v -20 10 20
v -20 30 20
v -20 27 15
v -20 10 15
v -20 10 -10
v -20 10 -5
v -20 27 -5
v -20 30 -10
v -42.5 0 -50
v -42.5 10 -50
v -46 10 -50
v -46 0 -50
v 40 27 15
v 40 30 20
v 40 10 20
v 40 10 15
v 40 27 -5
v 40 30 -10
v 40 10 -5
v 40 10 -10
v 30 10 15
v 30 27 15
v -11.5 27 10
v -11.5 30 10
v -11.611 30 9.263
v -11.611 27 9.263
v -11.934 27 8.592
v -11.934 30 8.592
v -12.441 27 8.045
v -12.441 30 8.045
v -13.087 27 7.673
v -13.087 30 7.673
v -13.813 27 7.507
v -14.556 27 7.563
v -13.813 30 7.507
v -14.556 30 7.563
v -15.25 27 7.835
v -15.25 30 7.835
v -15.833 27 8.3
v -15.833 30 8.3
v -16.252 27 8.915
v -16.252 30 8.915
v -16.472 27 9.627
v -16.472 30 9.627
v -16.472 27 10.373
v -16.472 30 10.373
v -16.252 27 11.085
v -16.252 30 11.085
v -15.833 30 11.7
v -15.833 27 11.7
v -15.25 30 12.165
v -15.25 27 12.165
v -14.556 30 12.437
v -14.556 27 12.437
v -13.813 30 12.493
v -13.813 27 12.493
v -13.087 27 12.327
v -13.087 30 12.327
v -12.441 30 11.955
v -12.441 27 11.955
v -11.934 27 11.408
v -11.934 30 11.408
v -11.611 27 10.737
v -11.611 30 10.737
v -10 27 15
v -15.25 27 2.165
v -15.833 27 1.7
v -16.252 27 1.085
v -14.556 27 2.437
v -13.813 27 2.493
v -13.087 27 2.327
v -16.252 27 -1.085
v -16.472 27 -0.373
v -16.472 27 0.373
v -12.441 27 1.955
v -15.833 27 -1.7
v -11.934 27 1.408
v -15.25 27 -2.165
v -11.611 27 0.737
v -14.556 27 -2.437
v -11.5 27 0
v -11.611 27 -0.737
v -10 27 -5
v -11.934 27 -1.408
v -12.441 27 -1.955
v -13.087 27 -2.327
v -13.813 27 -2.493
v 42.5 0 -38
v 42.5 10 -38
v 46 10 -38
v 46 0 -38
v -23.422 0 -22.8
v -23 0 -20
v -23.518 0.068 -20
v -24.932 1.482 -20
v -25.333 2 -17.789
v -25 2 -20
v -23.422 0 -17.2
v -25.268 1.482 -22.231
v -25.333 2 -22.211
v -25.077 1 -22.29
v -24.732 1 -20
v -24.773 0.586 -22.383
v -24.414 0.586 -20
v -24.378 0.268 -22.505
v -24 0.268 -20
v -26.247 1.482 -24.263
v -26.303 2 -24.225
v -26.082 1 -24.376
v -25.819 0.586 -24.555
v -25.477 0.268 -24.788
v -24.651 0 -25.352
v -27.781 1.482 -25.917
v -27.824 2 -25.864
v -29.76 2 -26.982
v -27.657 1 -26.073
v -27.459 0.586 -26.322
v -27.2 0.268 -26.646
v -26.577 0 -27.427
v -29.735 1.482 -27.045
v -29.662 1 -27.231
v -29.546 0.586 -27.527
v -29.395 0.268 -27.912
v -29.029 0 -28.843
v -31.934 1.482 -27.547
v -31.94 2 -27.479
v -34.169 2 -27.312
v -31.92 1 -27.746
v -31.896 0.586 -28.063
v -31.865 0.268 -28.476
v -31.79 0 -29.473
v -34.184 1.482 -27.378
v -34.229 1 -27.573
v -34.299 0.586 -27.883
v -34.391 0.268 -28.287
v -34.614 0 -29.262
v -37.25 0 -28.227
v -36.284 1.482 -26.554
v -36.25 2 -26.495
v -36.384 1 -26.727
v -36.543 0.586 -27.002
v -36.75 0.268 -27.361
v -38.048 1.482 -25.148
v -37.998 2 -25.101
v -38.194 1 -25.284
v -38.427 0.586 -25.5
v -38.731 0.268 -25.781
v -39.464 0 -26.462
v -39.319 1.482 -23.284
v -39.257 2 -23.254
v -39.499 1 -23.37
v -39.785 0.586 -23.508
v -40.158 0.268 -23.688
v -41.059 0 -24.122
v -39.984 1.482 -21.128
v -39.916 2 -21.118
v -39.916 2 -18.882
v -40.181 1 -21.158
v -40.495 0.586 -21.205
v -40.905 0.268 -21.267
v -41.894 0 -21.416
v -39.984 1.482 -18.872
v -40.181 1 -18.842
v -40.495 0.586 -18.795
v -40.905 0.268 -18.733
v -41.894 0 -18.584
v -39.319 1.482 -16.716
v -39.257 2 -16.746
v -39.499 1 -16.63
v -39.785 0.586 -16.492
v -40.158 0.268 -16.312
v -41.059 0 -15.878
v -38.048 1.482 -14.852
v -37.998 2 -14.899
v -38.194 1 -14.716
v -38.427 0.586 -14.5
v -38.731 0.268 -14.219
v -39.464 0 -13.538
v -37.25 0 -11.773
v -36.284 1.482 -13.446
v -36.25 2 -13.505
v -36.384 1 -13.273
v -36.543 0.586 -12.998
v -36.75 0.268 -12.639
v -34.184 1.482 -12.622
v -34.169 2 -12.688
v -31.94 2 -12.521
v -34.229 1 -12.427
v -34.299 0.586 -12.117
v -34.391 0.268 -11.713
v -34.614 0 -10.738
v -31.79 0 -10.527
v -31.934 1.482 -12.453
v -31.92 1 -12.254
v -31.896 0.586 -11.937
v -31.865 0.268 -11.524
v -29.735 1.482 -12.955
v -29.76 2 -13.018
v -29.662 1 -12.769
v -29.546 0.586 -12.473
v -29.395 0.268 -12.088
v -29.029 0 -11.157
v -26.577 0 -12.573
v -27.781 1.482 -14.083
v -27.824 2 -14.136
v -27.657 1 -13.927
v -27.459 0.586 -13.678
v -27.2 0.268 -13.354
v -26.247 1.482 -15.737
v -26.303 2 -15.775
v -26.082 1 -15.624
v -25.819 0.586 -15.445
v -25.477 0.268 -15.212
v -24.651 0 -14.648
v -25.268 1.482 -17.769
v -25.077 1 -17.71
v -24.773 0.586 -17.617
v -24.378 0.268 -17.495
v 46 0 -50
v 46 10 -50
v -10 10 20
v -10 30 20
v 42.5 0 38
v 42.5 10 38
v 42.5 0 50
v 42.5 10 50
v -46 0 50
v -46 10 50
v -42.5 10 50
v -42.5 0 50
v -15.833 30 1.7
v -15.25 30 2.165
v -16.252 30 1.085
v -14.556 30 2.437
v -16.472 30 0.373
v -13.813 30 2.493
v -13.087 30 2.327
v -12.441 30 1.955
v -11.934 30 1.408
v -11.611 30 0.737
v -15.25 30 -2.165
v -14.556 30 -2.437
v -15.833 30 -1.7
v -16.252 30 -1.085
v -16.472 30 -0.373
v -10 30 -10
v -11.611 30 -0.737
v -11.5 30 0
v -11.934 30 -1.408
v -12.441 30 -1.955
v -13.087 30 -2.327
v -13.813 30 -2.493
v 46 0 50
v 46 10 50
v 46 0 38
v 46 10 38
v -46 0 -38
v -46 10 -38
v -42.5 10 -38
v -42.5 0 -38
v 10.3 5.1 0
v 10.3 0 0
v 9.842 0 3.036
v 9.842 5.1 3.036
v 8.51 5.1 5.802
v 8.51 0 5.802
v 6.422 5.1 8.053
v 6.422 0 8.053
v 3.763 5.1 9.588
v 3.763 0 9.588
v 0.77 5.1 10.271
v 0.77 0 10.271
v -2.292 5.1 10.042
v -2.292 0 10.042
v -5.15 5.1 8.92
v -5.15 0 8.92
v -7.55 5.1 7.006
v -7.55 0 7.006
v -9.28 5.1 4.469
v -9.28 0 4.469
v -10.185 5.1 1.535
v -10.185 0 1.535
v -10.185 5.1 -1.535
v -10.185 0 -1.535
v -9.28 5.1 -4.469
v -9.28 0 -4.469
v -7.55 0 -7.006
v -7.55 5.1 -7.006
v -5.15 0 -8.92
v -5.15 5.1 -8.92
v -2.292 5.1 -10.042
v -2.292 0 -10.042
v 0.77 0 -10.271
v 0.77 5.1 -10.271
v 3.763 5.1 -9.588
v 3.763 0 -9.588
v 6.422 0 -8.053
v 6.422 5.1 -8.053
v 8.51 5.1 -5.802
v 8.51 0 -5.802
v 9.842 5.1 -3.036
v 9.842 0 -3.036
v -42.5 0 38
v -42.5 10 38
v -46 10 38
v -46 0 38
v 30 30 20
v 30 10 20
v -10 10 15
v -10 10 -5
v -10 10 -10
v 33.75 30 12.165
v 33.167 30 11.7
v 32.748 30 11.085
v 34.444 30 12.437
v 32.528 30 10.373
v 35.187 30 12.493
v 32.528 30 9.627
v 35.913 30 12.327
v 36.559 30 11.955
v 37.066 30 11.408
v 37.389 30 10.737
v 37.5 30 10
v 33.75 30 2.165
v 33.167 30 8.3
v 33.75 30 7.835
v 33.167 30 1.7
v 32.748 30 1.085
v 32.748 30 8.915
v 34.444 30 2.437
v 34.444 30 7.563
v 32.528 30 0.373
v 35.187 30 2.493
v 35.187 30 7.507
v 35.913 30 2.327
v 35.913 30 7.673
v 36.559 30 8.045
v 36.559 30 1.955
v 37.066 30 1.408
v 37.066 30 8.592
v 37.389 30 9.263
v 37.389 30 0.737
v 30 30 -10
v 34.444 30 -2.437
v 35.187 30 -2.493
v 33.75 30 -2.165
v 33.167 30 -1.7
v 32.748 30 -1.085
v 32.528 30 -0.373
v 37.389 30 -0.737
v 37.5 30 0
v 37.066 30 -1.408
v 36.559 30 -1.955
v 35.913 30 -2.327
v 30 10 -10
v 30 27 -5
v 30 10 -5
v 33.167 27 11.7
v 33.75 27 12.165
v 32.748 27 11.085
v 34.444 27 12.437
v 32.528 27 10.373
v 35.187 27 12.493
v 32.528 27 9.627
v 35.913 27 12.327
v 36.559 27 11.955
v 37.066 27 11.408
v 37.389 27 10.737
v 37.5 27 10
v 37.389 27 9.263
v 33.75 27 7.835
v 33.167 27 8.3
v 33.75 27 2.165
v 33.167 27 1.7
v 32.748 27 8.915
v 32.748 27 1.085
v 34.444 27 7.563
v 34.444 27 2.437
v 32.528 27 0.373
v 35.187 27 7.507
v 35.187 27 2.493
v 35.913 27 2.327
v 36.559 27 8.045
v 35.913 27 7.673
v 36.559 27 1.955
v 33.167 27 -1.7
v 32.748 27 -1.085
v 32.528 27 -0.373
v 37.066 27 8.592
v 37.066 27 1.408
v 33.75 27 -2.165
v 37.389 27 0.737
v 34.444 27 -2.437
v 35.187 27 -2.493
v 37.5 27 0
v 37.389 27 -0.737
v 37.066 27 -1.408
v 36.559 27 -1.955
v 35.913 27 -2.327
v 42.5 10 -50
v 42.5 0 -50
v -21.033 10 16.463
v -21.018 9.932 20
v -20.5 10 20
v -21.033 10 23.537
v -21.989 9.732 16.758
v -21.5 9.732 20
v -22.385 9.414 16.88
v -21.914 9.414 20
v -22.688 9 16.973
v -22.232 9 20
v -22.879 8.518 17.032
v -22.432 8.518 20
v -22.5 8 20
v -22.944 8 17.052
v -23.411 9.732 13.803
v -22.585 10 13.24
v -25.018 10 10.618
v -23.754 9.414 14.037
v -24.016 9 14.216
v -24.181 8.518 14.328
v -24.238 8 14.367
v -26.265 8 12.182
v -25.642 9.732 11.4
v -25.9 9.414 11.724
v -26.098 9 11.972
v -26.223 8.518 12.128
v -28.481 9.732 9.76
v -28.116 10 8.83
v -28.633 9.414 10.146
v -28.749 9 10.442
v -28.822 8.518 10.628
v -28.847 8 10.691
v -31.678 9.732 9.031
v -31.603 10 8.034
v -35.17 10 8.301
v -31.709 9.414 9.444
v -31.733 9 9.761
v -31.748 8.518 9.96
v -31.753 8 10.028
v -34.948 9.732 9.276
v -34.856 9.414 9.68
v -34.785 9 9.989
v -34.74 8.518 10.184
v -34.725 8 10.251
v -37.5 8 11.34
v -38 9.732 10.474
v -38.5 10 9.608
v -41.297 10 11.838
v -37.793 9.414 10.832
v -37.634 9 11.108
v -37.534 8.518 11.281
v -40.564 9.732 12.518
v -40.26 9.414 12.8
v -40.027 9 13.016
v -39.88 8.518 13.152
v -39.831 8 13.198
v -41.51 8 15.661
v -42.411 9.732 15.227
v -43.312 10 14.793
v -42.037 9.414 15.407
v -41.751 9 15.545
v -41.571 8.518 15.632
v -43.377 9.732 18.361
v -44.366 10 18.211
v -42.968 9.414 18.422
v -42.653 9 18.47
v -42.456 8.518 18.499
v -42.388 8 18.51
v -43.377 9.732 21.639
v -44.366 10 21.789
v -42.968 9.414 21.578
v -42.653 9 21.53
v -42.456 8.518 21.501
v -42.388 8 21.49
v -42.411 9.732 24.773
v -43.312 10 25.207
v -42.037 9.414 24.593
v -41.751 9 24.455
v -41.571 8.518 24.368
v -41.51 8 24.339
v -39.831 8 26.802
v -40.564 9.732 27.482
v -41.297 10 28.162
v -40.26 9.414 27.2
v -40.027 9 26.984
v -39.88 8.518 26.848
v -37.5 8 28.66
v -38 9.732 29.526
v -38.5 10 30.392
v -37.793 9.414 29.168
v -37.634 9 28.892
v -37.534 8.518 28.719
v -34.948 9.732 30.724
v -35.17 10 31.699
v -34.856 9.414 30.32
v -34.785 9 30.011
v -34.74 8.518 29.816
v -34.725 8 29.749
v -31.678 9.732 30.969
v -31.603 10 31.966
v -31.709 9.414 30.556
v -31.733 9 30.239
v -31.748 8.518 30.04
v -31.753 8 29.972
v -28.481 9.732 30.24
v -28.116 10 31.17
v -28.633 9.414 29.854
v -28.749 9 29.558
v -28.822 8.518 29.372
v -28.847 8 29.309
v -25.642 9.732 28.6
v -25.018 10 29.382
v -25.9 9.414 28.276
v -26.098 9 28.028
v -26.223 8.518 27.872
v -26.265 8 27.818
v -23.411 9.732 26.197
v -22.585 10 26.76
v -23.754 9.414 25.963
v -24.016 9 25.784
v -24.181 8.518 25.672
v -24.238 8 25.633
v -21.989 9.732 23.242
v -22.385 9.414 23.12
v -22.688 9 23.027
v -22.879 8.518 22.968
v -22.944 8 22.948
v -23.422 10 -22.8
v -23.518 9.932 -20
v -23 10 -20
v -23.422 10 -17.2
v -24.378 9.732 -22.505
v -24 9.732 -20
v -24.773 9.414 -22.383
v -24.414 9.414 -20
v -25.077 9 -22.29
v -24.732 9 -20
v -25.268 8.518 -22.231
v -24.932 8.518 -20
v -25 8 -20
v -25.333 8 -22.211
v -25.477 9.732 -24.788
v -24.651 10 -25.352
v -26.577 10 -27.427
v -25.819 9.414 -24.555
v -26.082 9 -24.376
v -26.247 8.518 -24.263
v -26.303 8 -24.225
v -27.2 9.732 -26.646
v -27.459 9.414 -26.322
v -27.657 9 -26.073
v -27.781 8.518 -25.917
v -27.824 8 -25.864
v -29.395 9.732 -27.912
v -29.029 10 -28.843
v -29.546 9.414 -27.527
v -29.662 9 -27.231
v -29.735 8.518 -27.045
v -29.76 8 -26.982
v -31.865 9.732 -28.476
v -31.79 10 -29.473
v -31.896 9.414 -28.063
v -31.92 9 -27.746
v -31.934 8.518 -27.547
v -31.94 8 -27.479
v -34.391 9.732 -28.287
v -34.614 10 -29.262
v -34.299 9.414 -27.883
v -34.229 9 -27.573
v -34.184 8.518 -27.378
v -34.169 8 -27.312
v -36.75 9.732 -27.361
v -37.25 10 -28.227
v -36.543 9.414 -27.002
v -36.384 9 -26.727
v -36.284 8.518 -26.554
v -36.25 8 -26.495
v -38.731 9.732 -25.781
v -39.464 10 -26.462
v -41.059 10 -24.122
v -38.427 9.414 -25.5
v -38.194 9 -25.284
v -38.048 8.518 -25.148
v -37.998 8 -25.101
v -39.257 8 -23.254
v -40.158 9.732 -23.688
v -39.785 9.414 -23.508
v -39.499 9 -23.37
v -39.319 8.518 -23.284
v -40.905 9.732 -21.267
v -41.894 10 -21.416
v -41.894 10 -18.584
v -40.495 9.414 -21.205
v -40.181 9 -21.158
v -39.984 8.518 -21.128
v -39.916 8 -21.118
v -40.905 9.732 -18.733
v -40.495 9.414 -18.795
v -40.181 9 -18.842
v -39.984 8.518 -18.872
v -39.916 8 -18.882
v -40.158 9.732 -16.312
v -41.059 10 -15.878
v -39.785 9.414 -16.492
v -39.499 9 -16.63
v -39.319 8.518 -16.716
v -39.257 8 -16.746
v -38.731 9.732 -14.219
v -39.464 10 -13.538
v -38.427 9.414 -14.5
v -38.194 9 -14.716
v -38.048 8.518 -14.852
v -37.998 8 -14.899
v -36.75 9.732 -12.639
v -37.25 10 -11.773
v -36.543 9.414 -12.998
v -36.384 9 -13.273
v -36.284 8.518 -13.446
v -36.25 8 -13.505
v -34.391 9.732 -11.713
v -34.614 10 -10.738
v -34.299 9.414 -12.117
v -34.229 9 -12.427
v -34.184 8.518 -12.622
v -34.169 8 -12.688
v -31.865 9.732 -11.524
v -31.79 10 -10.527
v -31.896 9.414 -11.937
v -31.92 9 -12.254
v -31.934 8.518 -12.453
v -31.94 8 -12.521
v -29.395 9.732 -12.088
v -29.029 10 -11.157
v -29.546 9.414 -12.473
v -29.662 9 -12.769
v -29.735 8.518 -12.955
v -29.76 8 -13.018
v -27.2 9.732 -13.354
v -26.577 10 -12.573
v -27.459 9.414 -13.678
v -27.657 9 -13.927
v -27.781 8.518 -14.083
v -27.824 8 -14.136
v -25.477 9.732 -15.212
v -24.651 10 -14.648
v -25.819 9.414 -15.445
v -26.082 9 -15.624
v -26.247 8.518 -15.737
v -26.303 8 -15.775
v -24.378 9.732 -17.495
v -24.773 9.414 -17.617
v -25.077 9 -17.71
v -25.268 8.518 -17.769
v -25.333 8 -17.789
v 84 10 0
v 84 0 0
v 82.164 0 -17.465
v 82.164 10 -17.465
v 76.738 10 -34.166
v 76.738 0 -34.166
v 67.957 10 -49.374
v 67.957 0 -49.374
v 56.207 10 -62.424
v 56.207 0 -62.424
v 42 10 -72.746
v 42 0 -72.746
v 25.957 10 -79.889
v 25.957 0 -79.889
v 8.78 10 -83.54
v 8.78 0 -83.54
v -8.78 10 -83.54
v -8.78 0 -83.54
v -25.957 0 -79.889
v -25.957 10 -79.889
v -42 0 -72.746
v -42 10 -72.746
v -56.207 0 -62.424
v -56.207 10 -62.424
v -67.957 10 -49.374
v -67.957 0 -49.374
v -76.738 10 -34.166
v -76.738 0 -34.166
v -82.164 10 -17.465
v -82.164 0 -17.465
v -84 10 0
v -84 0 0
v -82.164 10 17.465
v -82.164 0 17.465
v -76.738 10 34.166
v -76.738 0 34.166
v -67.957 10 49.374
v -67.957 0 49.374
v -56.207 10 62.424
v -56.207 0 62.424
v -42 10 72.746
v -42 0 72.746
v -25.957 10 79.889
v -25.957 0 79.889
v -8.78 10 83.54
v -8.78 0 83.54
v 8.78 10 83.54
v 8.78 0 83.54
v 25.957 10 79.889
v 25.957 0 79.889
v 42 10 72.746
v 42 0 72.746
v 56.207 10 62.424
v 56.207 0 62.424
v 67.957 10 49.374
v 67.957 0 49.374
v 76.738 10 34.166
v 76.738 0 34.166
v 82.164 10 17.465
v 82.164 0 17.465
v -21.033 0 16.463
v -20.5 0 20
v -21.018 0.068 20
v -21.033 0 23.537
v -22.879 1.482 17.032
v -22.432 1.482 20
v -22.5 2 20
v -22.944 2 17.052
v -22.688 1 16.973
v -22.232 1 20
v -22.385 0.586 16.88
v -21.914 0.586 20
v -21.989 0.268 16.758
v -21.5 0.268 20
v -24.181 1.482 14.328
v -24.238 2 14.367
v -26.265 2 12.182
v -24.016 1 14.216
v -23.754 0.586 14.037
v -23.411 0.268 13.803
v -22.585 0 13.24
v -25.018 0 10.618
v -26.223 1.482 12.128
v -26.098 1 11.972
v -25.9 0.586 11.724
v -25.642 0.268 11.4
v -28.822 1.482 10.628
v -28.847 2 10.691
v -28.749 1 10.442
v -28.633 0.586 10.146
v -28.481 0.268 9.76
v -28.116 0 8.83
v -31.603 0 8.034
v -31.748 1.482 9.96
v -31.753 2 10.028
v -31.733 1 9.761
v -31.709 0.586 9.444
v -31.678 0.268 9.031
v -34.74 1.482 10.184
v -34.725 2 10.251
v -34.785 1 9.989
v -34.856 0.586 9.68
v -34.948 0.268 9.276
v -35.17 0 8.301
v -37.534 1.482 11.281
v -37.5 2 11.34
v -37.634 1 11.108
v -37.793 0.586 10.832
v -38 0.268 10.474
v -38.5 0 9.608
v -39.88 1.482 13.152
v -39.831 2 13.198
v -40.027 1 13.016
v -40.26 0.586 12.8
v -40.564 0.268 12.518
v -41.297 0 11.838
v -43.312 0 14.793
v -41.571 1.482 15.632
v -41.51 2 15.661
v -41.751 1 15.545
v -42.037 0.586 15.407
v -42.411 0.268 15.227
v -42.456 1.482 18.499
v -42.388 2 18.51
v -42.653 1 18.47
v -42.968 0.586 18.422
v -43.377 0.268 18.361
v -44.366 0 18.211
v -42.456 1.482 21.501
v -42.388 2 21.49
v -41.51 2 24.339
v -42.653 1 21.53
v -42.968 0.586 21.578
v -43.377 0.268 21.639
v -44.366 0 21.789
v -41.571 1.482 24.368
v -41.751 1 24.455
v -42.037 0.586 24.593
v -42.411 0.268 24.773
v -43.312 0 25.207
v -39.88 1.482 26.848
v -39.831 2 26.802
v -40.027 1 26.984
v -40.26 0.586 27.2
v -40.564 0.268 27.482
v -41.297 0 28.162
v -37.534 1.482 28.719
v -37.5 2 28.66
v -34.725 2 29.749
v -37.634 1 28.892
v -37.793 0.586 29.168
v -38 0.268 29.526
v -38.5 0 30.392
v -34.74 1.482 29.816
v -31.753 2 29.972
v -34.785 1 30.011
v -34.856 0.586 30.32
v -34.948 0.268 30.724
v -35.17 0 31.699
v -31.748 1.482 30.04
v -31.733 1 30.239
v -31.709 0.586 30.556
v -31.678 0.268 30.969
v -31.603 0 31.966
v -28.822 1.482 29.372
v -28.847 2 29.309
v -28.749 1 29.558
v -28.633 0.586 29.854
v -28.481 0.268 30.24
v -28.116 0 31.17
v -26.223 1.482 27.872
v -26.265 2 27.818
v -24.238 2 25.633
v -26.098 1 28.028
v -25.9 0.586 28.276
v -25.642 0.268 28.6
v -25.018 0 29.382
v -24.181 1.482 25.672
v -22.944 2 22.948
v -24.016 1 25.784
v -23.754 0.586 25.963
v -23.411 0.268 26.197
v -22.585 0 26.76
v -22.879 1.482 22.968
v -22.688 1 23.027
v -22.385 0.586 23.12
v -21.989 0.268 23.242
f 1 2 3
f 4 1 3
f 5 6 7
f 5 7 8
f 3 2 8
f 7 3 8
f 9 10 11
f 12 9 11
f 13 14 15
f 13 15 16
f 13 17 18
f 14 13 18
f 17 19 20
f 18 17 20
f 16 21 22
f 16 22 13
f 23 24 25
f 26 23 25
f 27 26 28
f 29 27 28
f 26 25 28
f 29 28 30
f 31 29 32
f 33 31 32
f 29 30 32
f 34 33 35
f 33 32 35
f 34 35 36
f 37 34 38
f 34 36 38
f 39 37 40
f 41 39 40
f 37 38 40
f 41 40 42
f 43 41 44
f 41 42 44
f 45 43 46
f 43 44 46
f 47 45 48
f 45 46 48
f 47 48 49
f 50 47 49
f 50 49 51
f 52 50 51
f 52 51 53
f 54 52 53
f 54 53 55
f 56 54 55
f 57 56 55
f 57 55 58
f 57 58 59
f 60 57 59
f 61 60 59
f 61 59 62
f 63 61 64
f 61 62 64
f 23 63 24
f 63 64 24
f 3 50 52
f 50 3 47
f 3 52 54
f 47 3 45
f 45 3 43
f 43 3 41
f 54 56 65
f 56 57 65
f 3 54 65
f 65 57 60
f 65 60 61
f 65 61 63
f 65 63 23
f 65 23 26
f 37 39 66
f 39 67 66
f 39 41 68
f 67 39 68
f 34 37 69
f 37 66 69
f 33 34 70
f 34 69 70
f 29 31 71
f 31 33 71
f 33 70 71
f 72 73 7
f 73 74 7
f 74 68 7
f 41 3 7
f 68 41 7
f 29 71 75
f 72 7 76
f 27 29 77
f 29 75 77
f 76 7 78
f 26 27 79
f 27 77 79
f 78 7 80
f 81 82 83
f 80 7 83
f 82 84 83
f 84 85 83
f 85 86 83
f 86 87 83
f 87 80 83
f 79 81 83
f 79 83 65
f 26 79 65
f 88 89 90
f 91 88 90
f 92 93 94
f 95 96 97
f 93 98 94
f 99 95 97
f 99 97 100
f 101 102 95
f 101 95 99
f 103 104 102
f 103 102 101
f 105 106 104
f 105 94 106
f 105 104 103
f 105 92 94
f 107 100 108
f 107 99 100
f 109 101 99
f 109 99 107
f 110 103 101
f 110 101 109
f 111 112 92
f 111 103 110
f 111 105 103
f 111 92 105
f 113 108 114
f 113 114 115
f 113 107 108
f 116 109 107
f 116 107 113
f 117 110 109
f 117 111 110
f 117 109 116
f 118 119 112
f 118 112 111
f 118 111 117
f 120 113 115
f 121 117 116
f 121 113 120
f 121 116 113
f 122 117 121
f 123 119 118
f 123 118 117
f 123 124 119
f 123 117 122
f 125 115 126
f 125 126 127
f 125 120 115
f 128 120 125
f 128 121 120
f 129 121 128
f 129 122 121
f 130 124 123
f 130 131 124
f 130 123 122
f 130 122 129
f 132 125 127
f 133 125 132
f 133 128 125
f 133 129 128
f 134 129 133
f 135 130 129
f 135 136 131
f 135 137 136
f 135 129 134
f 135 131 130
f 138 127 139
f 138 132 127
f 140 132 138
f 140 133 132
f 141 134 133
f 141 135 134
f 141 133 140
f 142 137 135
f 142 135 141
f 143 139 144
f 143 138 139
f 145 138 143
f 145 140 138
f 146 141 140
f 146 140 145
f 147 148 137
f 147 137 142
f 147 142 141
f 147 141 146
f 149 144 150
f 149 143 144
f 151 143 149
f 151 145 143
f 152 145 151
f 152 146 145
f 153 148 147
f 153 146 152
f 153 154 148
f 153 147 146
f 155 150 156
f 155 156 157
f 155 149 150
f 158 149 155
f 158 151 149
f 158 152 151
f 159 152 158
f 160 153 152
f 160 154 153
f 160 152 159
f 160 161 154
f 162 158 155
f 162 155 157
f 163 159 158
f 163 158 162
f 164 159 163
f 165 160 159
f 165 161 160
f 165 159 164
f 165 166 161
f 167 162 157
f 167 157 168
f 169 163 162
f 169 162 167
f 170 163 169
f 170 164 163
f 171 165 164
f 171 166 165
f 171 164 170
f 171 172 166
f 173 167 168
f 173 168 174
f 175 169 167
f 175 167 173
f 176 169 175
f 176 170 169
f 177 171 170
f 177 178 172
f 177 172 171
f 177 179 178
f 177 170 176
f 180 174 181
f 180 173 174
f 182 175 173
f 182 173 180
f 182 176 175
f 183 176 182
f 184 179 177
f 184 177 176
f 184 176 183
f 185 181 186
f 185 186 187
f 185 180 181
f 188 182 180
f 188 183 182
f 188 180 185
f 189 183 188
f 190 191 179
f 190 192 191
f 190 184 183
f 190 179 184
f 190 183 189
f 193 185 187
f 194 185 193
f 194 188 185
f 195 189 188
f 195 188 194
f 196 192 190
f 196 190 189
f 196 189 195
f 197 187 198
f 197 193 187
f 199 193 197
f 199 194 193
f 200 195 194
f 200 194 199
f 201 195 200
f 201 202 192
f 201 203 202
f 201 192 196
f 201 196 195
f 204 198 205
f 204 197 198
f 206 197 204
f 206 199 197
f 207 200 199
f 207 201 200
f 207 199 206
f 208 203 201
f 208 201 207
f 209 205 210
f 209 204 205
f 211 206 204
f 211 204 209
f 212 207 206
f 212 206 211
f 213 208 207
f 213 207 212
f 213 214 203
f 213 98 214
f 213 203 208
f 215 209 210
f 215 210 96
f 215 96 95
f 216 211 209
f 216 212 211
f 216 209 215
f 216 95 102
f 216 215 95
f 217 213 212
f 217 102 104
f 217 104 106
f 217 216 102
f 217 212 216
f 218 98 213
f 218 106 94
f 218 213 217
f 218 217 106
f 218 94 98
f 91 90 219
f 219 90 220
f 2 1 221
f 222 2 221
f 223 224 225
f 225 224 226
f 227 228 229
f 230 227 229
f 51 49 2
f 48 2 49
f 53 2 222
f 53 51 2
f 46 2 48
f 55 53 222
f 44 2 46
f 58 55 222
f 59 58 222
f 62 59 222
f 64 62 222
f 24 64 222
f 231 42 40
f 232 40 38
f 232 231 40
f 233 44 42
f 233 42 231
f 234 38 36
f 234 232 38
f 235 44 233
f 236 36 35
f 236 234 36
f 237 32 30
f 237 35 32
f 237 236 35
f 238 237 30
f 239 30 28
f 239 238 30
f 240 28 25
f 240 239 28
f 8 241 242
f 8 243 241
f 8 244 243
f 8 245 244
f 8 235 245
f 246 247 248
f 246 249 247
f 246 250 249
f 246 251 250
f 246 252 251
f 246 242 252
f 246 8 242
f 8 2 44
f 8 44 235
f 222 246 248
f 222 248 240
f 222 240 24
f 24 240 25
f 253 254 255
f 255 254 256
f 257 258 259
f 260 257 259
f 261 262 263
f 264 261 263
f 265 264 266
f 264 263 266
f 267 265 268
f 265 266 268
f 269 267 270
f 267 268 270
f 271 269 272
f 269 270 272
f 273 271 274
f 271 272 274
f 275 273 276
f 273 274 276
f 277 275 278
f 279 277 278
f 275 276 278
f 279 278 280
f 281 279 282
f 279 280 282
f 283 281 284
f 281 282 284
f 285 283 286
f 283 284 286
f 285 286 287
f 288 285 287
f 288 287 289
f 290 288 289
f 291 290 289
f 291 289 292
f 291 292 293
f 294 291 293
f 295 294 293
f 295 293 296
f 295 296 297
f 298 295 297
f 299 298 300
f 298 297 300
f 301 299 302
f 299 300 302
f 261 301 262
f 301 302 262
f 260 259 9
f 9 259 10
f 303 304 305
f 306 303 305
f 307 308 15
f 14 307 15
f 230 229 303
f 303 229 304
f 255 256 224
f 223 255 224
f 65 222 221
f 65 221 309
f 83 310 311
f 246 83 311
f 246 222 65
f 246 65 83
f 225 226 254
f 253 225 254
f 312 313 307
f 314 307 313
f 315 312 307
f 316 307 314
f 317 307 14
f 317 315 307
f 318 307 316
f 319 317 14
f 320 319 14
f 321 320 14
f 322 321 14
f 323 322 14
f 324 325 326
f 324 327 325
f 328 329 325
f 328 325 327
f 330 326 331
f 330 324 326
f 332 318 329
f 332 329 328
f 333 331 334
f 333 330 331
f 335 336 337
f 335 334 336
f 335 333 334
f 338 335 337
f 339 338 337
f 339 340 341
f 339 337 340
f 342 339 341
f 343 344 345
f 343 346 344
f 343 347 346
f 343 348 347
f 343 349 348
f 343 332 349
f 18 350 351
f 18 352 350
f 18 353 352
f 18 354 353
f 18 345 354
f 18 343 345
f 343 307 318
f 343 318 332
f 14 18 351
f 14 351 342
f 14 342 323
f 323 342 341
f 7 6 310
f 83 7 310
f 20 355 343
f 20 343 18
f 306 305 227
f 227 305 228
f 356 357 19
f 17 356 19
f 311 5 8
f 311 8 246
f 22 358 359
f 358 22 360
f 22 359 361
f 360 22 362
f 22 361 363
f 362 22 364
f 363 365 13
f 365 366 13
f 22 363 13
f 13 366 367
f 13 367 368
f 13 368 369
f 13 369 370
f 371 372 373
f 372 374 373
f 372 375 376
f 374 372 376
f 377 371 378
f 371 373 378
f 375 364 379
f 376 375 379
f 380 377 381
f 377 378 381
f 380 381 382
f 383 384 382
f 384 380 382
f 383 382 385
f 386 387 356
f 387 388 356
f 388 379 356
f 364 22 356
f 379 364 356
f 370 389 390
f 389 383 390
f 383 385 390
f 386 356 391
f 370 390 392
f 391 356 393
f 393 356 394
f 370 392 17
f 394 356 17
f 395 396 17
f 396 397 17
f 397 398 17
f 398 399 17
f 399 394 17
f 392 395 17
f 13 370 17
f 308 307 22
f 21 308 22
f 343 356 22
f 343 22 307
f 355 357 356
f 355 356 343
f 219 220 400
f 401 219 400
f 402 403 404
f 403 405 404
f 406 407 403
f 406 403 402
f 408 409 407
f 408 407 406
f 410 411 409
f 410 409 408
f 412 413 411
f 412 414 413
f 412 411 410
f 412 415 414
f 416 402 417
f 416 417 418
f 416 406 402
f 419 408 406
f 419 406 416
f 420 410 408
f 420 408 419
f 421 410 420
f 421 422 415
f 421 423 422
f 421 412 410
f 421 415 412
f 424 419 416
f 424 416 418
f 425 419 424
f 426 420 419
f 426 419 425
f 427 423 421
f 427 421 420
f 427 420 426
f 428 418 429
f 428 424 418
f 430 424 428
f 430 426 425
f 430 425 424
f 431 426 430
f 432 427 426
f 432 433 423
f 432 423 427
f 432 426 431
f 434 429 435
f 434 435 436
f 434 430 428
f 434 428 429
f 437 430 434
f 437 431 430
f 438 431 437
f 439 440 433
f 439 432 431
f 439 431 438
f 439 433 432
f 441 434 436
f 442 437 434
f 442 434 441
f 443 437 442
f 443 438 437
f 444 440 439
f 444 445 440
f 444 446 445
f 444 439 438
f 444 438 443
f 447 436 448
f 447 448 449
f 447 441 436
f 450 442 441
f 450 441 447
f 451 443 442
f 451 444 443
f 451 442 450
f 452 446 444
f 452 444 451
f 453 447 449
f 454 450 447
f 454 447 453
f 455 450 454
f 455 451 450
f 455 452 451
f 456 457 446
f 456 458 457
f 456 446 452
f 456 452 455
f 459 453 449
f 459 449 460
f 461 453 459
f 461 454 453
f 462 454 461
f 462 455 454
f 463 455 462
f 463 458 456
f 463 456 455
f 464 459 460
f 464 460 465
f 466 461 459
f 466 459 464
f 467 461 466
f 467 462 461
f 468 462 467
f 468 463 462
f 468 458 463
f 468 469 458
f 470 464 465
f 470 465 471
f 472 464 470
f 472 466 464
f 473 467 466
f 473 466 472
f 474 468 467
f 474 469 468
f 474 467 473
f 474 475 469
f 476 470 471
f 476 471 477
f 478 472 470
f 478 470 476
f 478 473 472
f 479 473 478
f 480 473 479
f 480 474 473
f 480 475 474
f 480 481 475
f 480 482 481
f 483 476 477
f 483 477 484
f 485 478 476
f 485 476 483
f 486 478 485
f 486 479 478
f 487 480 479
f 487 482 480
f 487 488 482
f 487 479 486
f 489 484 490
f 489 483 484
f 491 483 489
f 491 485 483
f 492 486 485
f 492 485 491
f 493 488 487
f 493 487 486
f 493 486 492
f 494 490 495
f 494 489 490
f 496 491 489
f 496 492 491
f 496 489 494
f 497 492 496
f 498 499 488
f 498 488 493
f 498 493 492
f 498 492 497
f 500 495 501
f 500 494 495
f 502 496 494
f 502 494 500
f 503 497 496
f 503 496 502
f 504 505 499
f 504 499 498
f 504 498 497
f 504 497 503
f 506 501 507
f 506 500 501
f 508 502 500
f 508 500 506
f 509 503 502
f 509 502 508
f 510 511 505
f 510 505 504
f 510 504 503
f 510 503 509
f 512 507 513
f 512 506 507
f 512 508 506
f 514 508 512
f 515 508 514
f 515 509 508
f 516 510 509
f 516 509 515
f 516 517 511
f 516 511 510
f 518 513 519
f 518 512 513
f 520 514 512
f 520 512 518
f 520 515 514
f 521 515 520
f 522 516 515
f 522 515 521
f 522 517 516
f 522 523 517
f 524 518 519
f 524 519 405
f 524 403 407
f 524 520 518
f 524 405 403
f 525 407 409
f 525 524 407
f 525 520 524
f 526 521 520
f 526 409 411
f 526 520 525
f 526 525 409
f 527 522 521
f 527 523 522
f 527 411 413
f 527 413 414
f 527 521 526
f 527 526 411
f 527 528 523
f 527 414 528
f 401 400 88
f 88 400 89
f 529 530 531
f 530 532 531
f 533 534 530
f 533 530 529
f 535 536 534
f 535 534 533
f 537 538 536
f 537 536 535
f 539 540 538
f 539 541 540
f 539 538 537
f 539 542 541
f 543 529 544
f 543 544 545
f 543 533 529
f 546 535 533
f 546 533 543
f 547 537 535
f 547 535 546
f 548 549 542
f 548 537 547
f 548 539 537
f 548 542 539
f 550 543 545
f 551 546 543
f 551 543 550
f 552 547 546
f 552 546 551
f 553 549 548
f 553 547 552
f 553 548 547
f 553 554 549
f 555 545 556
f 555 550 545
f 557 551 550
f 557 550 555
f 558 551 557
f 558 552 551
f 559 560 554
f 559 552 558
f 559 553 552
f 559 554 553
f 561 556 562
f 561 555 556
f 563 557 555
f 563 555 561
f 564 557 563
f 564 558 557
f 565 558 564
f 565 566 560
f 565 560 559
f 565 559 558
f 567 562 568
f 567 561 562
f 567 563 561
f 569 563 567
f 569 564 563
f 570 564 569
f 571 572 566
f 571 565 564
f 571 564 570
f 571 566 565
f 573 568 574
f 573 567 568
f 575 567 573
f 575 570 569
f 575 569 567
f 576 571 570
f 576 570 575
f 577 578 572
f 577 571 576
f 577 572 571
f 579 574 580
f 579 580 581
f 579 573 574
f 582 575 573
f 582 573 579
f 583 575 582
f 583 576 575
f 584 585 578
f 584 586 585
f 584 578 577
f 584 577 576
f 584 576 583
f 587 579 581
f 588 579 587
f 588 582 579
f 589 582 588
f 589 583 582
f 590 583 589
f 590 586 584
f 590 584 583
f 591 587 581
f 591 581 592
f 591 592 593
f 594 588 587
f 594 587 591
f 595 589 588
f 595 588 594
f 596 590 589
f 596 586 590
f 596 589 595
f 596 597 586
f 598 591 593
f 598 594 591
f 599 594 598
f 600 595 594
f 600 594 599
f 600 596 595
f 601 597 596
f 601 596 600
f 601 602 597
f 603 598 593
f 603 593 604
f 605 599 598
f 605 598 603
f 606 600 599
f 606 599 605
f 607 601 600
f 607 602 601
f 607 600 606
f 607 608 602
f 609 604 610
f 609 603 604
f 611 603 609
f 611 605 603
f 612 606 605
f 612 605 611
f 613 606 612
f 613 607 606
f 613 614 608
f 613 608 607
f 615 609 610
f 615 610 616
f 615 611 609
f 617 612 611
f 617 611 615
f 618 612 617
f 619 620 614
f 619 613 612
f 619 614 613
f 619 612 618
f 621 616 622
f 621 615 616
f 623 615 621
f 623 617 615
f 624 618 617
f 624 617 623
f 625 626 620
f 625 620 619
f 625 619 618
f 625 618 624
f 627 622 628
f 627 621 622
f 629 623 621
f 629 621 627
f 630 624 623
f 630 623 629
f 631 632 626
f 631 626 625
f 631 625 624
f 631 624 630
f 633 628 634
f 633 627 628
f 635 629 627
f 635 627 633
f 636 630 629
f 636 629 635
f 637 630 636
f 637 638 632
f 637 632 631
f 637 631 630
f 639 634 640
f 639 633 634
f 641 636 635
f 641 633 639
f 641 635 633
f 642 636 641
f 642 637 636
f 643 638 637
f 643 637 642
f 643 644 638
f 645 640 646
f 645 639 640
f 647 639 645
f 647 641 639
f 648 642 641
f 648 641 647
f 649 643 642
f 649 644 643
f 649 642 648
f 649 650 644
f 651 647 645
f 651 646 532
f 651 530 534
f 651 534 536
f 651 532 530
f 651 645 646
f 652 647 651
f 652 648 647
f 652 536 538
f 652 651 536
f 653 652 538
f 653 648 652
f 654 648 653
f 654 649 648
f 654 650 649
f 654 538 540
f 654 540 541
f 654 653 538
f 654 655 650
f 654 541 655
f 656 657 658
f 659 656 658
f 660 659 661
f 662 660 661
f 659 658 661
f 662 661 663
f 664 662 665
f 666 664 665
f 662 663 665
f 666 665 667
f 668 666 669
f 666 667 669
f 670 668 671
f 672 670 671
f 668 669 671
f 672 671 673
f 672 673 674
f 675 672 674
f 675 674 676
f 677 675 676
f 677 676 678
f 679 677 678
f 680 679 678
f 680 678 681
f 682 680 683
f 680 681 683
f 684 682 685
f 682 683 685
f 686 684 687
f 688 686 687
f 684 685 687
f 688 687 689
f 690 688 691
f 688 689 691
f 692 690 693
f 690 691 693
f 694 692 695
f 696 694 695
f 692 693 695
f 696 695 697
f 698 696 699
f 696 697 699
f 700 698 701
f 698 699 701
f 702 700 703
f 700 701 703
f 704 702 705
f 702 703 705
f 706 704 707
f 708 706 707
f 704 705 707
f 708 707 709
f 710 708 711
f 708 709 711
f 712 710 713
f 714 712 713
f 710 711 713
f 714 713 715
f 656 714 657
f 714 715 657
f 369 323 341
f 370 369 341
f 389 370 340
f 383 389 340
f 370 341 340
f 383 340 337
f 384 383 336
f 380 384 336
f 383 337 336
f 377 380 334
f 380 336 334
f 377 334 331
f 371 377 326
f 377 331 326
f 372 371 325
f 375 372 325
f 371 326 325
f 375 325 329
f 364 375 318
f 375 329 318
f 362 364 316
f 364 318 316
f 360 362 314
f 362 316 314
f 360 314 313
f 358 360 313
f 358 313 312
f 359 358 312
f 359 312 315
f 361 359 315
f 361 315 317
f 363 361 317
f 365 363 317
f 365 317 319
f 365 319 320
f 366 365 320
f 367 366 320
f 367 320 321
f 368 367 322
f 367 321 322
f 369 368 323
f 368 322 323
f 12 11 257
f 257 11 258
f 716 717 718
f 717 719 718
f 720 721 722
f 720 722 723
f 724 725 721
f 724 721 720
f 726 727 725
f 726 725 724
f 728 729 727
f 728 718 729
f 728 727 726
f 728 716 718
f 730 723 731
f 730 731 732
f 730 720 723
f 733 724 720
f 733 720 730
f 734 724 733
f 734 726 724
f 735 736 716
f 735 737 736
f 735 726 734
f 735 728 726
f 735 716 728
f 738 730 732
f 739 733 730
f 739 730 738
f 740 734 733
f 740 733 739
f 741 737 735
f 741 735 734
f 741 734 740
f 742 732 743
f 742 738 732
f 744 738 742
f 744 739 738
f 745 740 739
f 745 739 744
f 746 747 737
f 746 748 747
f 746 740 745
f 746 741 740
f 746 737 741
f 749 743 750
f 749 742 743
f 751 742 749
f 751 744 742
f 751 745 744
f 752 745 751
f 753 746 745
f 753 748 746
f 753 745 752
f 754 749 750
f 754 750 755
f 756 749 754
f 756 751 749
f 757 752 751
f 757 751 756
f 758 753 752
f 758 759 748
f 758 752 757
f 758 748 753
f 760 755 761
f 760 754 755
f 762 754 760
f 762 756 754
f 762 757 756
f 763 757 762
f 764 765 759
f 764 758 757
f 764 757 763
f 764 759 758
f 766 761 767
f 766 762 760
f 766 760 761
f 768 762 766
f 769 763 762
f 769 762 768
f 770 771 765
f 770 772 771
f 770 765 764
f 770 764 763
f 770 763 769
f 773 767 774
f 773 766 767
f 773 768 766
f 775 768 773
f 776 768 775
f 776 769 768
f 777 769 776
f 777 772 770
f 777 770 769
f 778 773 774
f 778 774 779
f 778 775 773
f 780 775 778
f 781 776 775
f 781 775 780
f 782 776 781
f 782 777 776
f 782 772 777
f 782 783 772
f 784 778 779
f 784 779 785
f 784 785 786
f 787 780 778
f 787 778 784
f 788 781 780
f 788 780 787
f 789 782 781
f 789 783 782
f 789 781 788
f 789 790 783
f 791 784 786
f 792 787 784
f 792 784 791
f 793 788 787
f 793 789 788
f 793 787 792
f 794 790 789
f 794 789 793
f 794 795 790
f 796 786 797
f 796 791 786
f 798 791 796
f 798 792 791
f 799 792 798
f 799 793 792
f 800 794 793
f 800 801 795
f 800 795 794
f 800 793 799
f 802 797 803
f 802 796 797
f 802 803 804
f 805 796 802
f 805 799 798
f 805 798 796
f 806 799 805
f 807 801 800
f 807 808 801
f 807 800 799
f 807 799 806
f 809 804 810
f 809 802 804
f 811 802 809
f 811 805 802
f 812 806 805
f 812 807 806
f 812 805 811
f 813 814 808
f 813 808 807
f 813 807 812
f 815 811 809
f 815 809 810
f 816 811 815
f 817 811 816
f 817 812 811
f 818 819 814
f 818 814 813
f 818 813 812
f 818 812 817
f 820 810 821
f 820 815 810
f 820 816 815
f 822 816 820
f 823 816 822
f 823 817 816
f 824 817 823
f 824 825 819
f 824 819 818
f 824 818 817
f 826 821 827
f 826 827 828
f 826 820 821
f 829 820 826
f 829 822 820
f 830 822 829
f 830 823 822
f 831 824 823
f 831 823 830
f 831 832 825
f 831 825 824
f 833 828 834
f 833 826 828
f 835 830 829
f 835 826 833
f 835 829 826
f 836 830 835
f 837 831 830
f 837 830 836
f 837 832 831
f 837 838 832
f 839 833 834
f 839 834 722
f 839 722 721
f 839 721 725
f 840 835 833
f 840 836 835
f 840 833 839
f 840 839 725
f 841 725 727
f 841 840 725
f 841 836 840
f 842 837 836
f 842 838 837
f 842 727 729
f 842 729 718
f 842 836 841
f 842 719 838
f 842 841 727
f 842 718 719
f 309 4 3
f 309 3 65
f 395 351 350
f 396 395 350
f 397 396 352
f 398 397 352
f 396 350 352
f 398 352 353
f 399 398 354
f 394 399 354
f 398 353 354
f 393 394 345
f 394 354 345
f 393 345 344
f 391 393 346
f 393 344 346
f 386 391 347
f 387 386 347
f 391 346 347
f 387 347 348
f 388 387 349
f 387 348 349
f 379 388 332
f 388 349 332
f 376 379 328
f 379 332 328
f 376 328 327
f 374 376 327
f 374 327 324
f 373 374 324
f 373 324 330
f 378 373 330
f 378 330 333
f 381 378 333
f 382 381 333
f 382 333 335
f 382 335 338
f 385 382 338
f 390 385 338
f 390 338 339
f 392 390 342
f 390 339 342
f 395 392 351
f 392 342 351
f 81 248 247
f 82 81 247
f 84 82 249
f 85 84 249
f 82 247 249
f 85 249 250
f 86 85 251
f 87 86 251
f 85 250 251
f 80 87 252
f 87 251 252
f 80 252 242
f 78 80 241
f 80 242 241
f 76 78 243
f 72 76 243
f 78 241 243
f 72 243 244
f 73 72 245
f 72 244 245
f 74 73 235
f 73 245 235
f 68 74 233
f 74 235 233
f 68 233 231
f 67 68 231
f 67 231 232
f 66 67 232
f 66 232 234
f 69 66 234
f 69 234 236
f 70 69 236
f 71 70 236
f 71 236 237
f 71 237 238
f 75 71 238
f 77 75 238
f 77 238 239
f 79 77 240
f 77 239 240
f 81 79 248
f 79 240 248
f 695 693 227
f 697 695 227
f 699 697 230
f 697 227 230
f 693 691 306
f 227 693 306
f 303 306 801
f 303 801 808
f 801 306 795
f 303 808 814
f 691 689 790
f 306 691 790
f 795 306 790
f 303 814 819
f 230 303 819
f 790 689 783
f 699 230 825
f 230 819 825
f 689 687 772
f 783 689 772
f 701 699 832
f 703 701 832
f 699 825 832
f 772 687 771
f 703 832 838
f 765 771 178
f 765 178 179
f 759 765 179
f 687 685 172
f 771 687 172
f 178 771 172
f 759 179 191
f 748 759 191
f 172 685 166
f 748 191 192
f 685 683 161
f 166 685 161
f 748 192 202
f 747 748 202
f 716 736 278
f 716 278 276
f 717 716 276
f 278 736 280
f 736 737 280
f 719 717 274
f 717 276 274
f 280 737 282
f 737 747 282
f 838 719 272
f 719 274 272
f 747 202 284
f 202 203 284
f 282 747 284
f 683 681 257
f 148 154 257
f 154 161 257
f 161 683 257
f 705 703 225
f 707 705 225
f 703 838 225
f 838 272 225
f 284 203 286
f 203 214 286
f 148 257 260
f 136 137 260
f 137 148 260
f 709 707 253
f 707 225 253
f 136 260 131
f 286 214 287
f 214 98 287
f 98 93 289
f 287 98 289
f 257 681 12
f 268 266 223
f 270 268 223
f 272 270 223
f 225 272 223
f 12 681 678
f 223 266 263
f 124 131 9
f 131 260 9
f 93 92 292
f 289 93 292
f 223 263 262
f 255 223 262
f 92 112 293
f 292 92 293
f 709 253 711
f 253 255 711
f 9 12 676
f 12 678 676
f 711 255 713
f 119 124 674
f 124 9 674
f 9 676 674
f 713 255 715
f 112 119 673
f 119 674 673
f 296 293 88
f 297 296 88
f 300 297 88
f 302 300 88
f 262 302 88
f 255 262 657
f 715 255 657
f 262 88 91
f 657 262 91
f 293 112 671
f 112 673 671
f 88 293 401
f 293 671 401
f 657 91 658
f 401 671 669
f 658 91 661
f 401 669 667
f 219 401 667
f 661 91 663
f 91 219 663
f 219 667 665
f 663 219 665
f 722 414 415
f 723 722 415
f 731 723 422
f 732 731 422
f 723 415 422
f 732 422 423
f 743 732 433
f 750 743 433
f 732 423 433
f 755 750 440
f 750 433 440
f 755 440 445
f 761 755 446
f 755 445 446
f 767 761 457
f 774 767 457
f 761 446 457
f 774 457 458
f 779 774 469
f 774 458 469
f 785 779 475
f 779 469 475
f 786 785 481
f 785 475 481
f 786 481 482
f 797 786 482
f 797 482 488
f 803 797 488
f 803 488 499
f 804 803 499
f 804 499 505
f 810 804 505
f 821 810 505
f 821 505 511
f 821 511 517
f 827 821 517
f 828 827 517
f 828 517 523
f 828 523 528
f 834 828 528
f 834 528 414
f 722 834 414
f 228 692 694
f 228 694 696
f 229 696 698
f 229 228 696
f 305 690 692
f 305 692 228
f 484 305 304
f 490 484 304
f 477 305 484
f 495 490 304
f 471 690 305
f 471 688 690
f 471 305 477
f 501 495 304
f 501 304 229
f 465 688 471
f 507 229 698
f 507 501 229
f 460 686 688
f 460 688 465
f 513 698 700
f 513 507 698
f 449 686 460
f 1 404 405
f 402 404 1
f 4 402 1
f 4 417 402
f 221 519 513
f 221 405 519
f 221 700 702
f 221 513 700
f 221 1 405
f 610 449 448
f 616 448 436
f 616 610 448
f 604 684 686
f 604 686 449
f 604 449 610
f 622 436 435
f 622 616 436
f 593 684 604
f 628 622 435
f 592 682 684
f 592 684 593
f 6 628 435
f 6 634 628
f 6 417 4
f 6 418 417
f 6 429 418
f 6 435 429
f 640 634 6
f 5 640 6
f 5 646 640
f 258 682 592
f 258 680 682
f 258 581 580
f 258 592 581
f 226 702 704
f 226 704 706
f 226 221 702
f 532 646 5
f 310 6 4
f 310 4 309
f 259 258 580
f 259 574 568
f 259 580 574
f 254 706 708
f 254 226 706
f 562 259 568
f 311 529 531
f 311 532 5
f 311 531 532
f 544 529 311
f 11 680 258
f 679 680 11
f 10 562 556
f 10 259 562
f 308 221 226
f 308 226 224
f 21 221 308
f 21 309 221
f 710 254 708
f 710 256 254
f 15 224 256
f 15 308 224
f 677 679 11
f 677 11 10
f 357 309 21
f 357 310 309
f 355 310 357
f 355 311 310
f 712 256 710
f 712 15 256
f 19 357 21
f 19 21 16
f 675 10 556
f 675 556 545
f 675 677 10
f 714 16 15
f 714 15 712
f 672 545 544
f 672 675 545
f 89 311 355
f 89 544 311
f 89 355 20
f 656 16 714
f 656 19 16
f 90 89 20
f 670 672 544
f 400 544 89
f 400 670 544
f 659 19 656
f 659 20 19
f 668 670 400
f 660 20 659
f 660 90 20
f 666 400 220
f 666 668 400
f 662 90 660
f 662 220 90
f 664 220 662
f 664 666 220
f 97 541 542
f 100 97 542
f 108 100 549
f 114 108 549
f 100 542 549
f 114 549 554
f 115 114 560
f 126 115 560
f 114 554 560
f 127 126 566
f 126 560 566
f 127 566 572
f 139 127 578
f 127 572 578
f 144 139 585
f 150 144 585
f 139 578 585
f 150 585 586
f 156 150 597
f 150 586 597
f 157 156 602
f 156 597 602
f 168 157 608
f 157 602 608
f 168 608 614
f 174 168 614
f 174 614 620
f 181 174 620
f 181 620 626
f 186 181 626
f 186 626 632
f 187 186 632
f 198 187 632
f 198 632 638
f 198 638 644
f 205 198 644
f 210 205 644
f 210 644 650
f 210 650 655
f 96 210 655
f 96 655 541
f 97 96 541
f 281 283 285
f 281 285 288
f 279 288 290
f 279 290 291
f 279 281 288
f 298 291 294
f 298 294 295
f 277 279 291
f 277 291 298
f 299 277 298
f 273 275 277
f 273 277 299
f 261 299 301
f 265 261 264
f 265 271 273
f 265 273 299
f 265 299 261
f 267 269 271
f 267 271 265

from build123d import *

# Parameters (mm, degrees)
SKETCH1_R               = 84
BASE_DEPTH              = 10
SKETCH3_W               = 10
SKETCH3_H               = 5
MOTOR_MOUNTS_BOTH_DEPTH = 20
SKETCH4_W               = 10
SKETCH4_H               = 20
SKETCH4_R               = 2.5
MOTOR_SCREW_HOLES_DEPTH = 3
SKETCH5_R               = 10.3
GEAR_HOLE_DEPTH         = 5.1
WIRE_HOLES_REACH        = 12
SKETCH6_R               = 7.5
SKETCH6_R_2             = 10
CUT_EXTRUDE1_REACH      = 12
FILLET2_R               = 2


with BuildPart() as part:
    # Sketch1 → base (new body)
    with BuildSketch(Plane(origin=(0, 0, 0), x_dir=(1, 0, 0), z_dir=(0, 1, 0))):
        Circle(SKETCH1_R)
    extrude(amount=BASE_DEPTH)

    # Sketch3 → motor mounts (both) (add)
    with BuildSketch(Plane(origin=(0, 10, 0), x_dir=(1, 0, 0), z_dir=(0, 1, 0))):
        with Locations((-15, 7.5)):
            Rectangle(SKETCH3_W, SKETCH3_H)
        with Locations((-15, -17.5)):
            Rectangle(SKETCH3_W, SKETCH3_H)
        with Locations((35, -17.5)):
            Rectangle(SKETCH3_W, SKETCH3_H)
        with Locations((35, 7.5)):
            Rectangle(SKETCH3_W, SKETCH3_H)
    extrude(amount=MOTOR_MOUNTS_BOTH_DEPTH)

    # Sketch4 → motor screw holes (add)
    with BuildSketch(Plane(origin=(0, 30, 0), x_dir=(1, 0, 0), z_dir=(0, 1, 0))):
        with Locations((-15, -5)):
            Rectangle(SKETCH4_W, SKETCH4_H)
        with Locations((-14, 0)):
            Circle(SKETCH4_R, mode=Mode.SUBTRACT)
        with Locations((-14, -10)):
            Circle(SKETCH4_R, mode=Mode.SUBTRACT)
        with Locations((35, -5)):
            Rectangle(SKETCH4_W, SKETCH4_H)
        with Locations((35, 0)):
            Circle(SKETCH4_R, mode=Mode.SUBTRACT)
        with Locations((35, -10)):
            Circle(SKETCH4_R, mode=Mode.SUBTRACT)
    extrude(amount=-MOTOR_SCREW_HOLES_DEPTH)

    # Sketch5 → gear hole (cut)
    with BuildSketch(Plane.XZ):
        Circle(SKETCH5_R)
    extrude(amount=-GEAR_HOLE_DEPTH, mode=Mode.SUBTRACT)

    # Sketch6 → wire holes (cut, up to next)
    with BuildSketch(Plane(origin=(0, 10, 0), x_dir=(1, 0, 0), z_dir=(0, 1, 0)), mode=Mode.PRIVATE) as wire_holes_sk1:
        with Locations((-32.5, 20)):
            Circle(SKETCH6_R)
    wire_holes_tool1 = extrude(wire_holes_sk1.sketch, amount=-WIRE_HOLES_REACH, mode=Mode.PRIVATE) & part.part
    add(wire_holes_tool1.solids().sort_by_distance((-32.5, 10, -20))[0], mode=Mode.SUBTRACT)
    # Sketch6 → wire holes (cut, up to next)
    with BuildSketch(Plane(origin=(0, 10, 0), x_dir=(1, 0, 0), z_dir=(0, 1, 0)), mode=Mode.PRIVATE) as wire_holes_sk2:
        with Locations((-32.5, -20)):
            Circle(SKETCH6_R_2)
    wire_holes_tool2 = extrude(wire_holes_sk2.sketch, amount=-WIRE_HOLES_REACH, mode=Mode.PRIVATE) & part.part
    add(wire_holes_tool2.solids().sort_by_distance((-32.5, 10, 20))[0], mode=Mode.SUBTRACT)

    # Sketch7 → Cut-Extrude1 (cut, up to next)
    with BuildSketch(Plane(origin=(0, 10, 0), x_dir=(1, 0, 0), z_dir=(0, 1, 0)), mode=Mode.PRIVATE) as cut_extrude1_sk1:
        Polygon((-42.5, 38), (-42.5, 47.5), (-42.5, 50), (-46, 50), (-46, 38), align=None)
    cut_extrude1_tool1 = extrude(cut_extrude1_sk1.sketch, amount=-CUT_EXTRUDE1_REACH, mode=Mode.PRIVATE) & part.part
    add(cut_extrude1_tool1.solids().sort_by_distance((-44.25, 10, -44))[0], mode=Mode.SUBTRACT)
    # Sketch7 → Cut-Extrude1 (cut, up to next)
    with BuildSketch(Plane(origin=(0, 10, 0), x_dir=(1, 0, 0), z_dir=(0, 1, 0)), mode=Mode.PRIVATE) as cut_extrude1_sk2:
        Polygon((42.5, 50), (42.5, 47.5), (42.5, 38), (46, 38), (46, 50), align=None)
    cut_extrude1_tool2 = extrude(cut_extrude1_sk2.sketch, amount=-CUT_EXTRUDE1_REACH, mode=Mode.PRIVATE) & part.part
    add(cut_extrude1_tool2.solids().sort_by_distance((44.25, 10, -44))[0], mode=Mode.SUBTRACT)
    # Sketch7 → Cut-Extrude1 (cut, up to next)
    with BuildSketch(Plane(origin=(0, 10, 0), x_dir=(1, 0, 0), z_dir=(0, 1, 0)), mode=Mode.PRIVATE) as cut_extrude1_sk3:
        Polygon((46, -38), (42.5, -38), (42.5, -47.5), (42.5, -50), (46, -50), align=None)
    cut_extrude1_tool3 = extrude(cut_extrude1_sk3.sketch, amount=-CUT_EXTRUDE1_REACH, mode=Mode.PRIVATE) & part.part
    add(cut_extrude1_tool3.solids().sort_by_distance((44.25, 10, 44))[0], mode=Mode.SUBTRACT)
    # Sketch7 → Cut-Extrude1 (cut, up to next)
    with BuildSketch(Plane(origin=(0, 10, 0), x_dir=(1, 0, 0), z_dir=(0, 1, 0)), mode=Mode.PRIVATE) as cut_extrude1_sk4:
        Polygon((-42.5, -47.5), (-42.5, -38), (-46, -38), (-46, -50), (-42.5, -50), align=None)
    cut_extrude1_tool4 = extrude(cut_extrude1_sk4.sketch, amount=-CUT_EXTRUDE1_REACH, mode=Mode.PRIVATE) & part.part
    add(cut_extrude1_tool4.solids().sort_by_distance((-44.25, 10, 44))[0], mode=Mode.SUBTRACT)

    # Fillet2
    fillet2_edges = [part.edges().sort_by_distance(p)[0] for p in [
        (-40, 10, -20),
        (-40, 0, -20),
        (-42.5, 10, 20),
        (-42.5, 0, 20),
    ]]
    fillet(fillet2_edges, radius=FILLET2_R)


solid = part.part
